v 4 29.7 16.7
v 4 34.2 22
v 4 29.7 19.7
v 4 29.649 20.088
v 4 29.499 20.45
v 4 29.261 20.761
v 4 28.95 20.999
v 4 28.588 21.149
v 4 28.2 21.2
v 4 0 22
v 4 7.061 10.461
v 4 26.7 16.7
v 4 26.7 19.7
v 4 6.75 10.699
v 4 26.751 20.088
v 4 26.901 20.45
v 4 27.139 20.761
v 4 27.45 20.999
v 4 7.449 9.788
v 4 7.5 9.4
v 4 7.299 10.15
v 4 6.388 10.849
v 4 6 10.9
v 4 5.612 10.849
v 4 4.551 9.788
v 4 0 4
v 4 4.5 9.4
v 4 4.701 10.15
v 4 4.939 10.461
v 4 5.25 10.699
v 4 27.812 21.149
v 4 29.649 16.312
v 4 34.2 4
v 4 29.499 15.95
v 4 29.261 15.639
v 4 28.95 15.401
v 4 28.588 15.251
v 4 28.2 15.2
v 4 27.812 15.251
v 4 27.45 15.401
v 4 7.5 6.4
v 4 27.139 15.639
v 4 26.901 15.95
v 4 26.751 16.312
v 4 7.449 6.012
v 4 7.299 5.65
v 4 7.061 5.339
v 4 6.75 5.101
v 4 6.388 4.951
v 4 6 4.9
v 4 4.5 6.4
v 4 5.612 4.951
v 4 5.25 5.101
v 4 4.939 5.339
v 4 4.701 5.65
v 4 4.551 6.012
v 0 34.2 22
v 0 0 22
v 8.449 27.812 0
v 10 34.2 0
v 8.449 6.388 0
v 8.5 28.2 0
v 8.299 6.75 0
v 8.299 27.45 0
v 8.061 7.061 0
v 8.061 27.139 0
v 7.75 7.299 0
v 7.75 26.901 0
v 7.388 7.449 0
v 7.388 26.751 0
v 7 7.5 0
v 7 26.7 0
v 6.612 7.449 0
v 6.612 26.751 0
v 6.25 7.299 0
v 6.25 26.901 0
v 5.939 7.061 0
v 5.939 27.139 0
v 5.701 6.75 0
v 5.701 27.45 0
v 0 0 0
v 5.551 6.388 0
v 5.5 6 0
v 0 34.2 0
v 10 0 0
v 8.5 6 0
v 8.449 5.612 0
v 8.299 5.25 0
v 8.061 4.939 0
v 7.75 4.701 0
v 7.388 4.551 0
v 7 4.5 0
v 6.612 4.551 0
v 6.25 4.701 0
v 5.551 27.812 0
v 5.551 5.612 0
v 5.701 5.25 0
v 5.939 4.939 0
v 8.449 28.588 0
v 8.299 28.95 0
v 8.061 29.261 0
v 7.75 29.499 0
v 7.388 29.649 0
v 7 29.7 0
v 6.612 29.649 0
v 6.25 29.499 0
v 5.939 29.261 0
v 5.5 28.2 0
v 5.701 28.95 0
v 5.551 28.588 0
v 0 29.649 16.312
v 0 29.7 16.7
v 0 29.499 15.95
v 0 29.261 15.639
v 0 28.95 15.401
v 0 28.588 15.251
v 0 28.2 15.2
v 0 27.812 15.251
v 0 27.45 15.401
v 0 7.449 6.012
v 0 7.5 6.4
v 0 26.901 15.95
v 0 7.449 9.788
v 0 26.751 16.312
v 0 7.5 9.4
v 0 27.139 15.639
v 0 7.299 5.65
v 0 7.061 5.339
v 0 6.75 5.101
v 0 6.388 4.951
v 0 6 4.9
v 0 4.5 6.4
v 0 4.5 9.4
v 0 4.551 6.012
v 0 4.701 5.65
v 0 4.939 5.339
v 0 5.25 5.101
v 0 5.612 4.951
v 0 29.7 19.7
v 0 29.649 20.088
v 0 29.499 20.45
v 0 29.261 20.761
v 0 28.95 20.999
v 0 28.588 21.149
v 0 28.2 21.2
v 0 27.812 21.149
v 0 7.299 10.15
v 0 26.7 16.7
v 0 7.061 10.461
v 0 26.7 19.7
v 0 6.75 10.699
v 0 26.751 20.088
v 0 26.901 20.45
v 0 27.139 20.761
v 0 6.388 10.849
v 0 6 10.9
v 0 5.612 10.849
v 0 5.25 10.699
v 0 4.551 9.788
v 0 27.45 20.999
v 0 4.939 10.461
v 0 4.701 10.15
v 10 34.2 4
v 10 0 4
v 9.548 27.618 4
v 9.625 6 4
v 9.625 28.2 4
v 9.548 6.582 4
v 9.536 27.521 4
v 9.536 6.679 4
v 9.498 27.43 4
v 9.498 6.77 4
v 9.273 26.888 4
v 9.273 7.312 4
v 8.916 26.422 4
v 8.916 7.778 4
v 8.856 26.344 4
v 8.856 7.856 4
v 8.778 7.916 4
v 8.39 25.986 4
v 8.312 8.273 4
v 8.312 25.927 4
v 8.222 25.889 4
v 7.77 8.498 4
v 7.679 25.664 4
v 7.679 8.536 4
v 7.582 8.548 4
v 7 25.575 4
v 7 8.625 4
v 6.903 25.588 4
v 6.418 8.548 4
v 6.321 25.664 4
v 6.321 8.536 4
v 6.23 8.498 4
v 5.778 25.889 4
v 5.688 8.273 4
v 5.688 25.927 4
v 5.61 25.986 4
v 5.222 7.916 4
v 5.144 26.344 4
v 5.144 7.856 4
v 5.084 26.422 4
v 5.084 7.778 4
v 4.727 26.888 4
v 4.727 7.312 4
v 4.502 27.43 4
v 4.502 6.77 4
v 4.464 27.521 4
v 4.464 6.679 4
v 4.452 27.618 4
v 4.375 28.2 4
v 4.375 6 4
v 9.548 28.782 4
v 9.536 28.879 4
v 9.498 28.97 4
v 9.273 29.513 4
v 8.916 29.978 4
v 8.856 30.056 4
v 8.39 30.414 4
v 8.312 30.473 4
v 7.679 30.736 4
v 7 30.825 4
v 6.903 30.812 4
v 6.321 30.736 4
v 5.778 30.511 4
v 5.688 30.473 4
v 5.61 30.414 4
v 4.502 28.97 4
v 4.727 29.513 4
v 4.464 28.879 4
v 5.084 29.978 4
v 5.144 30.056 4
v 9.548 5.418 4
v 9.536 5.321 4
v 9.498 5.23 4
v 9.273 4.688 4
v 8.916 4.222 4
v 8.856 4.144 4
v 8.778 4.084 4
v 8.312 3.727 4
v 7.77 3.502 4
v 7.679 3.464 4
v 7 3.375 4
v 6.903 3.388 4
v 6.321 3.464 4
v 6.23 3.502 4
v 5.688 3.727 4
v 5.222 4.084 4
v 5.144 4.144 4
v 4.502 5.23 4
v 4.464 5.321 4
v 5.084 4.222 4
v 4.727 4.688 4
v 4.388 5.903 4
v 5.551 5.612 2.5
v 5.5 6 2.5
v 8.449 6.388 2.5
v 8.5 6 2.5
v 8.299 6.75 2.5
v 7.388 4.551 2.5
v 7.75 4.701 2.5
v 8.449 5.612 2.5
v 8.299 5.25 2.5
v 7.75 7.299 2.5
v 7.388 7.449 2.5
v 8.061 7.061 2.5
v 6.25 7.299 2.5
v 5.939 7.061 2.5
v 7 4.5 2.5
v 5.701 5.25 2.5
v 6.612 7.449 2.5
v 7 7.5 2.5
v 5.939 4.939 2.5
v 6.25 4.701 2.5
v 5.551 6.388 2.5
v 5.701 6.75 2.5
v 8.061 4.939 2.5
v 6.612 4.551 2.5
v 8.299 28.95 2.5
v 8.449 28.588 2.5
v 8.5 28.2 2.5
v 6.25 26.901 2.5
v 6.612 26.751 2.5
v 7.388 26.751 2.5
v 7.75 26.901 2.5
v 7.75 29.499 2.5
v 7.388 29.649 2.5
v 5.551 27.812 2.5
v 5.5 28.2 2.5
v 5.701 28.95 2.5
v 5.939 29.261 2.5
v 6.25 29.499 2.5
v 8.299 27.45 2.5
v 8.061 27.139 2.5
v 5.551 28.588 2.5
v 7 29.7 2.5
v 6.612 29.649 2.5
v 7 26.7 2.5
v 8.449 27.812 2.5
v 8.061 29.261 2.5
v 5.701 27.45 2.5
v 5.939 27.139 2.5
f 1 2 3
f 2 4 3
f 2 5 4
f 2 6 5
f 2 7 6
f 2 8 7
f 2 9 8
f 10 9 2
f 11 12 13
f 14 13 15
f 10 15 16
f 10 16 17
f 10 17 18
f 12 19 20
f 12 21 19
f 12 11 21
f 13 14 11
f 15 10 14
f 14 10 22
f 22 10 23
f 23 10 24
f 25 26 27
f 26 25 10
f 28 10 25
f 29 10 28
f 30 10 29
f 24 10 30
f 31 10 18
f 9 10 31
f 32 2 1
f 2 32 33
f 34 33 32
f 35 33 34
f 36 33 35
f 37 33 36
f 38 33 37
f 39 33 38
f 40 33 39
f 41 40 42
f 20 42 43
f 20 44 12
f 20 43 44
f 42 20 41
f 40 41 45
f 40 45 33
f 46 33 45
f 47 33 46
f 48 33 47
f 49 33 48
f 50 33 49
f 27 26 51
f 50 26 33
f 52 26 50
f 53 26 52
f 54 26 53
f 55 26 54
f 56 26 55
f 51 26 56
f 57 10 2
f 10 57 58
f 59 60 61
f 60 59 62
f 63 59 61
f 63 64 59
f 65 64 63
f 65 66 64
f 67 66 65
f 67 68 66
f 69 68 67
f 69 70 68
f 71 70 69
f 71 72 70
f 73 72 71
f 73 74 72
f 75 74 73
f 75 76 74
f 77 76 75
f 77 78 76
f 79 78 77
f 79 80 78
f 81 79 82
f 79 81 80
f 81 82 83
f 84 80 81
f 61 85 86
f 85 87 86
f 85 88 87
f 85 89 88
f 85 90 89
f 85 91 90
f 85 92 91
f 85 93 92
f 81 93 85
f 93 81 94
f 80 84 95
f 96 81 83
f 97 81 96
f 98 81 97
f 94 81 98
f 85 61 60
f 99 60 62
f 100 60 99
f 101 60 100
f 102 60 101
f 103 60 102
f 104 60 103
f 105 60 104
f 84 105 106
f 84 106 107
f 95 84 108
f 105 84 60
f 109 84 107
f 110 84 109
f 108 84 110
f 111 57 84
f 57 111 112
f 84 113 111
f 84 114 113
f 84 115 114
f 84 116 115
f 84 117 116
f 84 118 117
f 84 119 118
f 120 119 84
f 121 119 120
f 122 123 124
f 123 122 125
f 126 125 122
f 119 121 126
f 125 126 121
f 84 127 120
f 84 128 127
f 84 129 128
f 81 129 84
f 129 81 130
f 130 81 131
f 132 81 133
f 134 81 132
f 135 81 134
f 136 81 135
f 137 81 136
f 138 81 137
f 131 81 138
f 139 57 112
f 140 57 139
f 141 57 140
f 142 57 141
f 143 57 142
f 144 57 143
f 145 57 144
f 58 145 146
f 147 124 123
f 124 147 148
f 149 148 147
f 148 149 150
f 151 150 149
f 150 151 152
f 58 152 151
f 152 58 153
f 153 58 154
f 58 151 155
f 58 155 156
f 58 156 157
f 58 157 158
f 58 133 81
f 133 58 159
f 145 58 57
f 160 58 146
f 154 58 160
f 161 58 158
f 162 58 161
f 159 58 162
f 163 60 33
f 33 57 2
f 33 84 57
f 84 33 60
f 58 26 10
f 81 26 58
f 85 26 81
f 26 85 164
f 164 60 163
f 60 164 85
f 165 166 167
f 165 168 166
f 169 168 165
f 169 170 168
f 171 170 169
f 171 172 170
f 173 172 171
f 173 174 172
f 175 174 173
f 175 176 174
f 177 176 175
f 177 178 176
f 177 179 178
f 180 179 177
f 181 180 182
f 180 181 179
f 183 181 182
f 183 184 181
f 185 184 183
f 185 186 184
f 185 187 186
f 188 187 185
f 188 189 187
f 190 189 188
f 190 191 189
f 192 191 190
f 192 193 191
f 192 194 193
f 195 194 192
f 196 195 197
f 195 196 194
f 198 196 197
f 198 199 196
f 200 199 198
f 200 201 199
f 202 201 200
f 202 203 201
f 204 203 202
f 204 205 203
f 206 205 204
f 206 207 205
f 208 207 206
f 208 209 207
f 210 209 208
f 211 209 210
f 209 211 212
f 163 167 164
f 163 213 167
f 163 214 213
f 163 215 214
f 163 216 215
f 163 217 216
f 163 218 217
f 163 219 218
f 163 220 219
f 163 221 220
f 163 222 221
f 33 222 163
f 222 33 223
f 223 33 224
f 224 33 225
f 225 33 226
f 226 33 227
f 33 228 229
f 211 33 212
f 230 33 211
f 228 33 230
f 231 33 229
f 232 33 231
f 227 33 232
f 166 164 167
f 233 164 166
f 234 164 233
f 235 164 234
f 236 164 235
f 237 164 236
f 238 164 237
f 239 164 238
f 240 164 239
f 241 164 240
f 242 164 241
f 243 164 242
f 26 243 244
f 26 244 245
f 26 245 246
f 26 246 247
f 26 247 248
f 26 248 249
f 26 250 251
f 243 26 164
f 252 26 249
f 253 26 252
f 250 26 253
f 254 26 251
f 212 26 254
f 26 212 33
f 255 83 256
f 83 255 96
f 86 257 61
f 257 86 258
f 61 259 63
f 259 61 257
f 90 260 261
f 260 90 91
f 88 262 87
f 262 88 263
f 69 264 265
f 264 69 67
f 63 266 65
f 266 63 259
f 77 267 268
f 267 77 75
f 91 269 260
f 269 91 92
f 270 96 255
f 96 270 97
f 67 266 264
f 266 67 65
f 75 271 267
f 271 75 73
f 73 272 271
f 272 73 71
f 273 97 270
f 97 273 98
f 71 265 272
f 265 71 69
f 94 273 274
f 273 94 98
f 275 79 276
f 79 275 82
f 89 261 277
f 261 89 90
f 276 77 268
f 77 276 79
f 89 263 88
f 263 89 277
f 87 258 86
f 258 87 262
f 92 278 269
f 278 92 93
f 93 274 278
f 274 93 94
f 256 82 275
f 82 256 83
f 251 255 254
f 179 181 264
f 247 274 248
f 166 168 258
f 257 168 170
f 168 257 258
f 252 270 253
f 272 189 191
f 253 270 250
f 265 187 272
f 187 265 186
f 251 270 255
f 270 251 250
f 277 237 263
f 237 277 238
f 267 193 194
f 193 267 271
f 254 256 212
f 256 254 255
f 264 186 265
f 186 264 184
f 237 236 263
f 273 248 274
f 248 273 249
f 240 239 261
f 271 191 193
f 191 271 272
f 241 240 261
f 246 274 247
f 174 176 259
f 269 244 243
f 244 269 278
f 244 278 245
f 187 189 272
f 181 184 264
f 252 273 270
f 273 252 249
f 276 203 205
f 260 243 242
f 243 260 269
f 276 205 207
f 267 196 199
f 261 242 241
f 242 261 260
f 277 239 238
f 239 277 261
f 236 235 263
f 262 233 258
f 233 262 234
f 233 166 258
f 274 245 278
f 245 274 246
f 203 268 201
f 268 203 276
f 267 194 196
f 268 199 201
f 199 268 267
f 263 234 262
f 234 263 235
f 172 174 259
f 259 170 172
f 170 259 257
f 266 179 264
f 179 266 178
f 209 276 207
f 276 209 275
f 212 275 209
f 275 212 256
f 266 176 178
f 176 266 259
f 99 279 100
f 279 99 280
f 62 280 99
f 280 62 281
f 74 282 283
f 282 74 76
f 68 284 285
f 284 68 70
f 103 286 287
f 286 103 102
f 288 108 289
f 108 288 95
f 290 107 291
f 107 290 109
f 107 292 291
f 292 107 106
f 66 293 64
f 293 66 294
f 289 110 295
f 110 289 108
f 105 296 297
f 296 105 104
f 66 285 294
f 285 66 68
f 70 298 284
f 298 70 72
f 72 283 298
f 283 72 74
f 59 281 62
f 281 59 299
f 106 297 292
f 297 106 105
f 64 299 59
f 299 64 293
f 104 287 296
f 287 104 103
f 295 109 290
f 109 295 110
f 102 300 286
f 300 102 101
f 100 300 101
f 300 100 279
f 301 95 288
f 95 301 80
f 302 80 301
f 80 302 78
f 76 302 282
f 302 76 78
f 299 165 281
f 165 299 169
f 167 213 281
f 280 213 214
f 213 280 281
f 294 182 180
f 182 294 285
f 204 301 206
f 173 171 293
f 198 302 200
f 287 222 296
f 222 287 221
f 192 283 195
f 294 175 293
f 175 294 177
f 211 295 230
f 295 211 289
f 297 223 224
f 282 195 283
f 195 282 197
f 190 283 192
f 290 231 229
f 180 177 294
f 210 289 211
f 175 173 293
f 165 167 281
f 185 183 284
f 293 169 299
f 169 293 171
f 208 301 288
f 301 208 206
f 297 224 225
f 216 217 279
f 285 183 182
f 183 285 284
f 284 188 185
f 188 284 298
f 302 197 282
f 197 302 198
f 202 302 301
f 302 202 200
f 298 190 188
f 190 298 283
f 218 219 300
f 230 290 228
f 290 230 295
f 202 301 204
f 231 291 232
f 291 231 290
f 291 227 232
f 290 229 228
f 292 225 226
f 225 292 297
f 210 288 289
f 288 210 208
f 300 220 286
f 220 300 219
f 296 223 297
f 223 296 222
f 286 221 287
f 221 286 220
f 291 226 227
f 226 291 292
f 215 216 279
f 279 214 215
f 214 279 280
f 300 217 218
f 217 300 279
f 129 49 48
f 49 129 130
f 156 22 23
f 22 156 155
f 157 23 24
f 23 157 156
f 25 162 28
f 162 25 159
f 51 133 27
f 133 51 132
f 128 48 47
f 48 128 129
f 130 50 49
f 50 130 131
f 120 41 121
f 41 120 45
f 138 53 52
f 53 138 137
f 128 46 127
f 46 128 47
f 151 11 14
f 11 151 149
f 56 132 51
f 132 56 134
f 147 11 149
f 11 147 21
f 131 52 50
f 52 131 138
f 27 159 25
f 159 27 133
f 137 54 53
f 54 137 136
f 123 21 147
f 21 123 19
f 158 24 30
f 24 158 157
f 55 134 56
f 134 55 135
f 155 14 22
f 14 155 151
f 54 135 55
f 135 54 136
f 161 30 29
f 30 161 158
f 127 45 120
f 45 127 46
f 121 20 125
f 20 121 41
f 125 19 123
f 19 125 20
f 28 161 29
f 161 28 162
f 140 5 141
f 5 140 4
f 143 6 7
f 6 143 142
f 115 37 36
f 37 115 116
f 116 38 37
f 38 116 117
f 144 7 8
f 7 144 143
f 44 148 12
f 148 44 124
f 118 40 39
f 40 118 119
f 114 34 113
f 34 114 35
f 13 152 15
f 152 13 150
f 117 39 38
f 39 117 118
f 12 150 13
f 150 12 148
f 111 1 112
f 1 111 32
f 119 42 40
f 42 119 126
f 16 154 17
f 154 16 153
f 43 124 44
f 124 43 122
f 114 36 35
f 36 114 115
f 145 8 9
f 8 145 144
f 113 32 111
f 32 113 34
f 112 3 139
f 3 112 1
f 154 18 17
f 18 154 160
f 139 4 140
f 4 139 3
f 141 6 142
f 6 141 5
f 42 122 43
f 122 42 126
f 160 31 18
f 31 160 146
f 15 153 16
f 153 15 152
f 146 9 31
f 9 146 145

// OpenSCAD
xSpace=22.2;
ySpace=10.3;
minY=6.4;
border=6;
slot=3;

difference()
{
  union()
  {
    cube([4,xSpace+border*2,19+slot]);
    cube([10,xSpace+border*2,4]);
  }
  translate([7,border,-1])
    cylinder(h=7,d=3, $fn=24);
  translate([7,border,2.5])
    cylinder(h=2,d1=3,d2=6, $fn=24);
  translate([7,xSpace+border,-1])
    cylinder(h=7,d=3, $fn=24);
  translate([7,xSpace+border,2.5])
    cylinder(h=2,d1=3,d2=6, $fn=24);
  translate([-1,border,minY])
    rotate([0,90,0])
      hull()
      {
        cylinder(h=7,d=3, $fn=24);
        translate([-slot,0,0]) cylinder(h=7,d=3, $fn=24);
      }
  translate([-1,border+xSpace,minY+ySpace])
    rotate([0,90,0])
      hull()
      {
        cylinder(h=7,d=3, $fn=24);
        translate([-slot,0,0]) cylinder(h=7,d=3, $fn=24);
      }
}
